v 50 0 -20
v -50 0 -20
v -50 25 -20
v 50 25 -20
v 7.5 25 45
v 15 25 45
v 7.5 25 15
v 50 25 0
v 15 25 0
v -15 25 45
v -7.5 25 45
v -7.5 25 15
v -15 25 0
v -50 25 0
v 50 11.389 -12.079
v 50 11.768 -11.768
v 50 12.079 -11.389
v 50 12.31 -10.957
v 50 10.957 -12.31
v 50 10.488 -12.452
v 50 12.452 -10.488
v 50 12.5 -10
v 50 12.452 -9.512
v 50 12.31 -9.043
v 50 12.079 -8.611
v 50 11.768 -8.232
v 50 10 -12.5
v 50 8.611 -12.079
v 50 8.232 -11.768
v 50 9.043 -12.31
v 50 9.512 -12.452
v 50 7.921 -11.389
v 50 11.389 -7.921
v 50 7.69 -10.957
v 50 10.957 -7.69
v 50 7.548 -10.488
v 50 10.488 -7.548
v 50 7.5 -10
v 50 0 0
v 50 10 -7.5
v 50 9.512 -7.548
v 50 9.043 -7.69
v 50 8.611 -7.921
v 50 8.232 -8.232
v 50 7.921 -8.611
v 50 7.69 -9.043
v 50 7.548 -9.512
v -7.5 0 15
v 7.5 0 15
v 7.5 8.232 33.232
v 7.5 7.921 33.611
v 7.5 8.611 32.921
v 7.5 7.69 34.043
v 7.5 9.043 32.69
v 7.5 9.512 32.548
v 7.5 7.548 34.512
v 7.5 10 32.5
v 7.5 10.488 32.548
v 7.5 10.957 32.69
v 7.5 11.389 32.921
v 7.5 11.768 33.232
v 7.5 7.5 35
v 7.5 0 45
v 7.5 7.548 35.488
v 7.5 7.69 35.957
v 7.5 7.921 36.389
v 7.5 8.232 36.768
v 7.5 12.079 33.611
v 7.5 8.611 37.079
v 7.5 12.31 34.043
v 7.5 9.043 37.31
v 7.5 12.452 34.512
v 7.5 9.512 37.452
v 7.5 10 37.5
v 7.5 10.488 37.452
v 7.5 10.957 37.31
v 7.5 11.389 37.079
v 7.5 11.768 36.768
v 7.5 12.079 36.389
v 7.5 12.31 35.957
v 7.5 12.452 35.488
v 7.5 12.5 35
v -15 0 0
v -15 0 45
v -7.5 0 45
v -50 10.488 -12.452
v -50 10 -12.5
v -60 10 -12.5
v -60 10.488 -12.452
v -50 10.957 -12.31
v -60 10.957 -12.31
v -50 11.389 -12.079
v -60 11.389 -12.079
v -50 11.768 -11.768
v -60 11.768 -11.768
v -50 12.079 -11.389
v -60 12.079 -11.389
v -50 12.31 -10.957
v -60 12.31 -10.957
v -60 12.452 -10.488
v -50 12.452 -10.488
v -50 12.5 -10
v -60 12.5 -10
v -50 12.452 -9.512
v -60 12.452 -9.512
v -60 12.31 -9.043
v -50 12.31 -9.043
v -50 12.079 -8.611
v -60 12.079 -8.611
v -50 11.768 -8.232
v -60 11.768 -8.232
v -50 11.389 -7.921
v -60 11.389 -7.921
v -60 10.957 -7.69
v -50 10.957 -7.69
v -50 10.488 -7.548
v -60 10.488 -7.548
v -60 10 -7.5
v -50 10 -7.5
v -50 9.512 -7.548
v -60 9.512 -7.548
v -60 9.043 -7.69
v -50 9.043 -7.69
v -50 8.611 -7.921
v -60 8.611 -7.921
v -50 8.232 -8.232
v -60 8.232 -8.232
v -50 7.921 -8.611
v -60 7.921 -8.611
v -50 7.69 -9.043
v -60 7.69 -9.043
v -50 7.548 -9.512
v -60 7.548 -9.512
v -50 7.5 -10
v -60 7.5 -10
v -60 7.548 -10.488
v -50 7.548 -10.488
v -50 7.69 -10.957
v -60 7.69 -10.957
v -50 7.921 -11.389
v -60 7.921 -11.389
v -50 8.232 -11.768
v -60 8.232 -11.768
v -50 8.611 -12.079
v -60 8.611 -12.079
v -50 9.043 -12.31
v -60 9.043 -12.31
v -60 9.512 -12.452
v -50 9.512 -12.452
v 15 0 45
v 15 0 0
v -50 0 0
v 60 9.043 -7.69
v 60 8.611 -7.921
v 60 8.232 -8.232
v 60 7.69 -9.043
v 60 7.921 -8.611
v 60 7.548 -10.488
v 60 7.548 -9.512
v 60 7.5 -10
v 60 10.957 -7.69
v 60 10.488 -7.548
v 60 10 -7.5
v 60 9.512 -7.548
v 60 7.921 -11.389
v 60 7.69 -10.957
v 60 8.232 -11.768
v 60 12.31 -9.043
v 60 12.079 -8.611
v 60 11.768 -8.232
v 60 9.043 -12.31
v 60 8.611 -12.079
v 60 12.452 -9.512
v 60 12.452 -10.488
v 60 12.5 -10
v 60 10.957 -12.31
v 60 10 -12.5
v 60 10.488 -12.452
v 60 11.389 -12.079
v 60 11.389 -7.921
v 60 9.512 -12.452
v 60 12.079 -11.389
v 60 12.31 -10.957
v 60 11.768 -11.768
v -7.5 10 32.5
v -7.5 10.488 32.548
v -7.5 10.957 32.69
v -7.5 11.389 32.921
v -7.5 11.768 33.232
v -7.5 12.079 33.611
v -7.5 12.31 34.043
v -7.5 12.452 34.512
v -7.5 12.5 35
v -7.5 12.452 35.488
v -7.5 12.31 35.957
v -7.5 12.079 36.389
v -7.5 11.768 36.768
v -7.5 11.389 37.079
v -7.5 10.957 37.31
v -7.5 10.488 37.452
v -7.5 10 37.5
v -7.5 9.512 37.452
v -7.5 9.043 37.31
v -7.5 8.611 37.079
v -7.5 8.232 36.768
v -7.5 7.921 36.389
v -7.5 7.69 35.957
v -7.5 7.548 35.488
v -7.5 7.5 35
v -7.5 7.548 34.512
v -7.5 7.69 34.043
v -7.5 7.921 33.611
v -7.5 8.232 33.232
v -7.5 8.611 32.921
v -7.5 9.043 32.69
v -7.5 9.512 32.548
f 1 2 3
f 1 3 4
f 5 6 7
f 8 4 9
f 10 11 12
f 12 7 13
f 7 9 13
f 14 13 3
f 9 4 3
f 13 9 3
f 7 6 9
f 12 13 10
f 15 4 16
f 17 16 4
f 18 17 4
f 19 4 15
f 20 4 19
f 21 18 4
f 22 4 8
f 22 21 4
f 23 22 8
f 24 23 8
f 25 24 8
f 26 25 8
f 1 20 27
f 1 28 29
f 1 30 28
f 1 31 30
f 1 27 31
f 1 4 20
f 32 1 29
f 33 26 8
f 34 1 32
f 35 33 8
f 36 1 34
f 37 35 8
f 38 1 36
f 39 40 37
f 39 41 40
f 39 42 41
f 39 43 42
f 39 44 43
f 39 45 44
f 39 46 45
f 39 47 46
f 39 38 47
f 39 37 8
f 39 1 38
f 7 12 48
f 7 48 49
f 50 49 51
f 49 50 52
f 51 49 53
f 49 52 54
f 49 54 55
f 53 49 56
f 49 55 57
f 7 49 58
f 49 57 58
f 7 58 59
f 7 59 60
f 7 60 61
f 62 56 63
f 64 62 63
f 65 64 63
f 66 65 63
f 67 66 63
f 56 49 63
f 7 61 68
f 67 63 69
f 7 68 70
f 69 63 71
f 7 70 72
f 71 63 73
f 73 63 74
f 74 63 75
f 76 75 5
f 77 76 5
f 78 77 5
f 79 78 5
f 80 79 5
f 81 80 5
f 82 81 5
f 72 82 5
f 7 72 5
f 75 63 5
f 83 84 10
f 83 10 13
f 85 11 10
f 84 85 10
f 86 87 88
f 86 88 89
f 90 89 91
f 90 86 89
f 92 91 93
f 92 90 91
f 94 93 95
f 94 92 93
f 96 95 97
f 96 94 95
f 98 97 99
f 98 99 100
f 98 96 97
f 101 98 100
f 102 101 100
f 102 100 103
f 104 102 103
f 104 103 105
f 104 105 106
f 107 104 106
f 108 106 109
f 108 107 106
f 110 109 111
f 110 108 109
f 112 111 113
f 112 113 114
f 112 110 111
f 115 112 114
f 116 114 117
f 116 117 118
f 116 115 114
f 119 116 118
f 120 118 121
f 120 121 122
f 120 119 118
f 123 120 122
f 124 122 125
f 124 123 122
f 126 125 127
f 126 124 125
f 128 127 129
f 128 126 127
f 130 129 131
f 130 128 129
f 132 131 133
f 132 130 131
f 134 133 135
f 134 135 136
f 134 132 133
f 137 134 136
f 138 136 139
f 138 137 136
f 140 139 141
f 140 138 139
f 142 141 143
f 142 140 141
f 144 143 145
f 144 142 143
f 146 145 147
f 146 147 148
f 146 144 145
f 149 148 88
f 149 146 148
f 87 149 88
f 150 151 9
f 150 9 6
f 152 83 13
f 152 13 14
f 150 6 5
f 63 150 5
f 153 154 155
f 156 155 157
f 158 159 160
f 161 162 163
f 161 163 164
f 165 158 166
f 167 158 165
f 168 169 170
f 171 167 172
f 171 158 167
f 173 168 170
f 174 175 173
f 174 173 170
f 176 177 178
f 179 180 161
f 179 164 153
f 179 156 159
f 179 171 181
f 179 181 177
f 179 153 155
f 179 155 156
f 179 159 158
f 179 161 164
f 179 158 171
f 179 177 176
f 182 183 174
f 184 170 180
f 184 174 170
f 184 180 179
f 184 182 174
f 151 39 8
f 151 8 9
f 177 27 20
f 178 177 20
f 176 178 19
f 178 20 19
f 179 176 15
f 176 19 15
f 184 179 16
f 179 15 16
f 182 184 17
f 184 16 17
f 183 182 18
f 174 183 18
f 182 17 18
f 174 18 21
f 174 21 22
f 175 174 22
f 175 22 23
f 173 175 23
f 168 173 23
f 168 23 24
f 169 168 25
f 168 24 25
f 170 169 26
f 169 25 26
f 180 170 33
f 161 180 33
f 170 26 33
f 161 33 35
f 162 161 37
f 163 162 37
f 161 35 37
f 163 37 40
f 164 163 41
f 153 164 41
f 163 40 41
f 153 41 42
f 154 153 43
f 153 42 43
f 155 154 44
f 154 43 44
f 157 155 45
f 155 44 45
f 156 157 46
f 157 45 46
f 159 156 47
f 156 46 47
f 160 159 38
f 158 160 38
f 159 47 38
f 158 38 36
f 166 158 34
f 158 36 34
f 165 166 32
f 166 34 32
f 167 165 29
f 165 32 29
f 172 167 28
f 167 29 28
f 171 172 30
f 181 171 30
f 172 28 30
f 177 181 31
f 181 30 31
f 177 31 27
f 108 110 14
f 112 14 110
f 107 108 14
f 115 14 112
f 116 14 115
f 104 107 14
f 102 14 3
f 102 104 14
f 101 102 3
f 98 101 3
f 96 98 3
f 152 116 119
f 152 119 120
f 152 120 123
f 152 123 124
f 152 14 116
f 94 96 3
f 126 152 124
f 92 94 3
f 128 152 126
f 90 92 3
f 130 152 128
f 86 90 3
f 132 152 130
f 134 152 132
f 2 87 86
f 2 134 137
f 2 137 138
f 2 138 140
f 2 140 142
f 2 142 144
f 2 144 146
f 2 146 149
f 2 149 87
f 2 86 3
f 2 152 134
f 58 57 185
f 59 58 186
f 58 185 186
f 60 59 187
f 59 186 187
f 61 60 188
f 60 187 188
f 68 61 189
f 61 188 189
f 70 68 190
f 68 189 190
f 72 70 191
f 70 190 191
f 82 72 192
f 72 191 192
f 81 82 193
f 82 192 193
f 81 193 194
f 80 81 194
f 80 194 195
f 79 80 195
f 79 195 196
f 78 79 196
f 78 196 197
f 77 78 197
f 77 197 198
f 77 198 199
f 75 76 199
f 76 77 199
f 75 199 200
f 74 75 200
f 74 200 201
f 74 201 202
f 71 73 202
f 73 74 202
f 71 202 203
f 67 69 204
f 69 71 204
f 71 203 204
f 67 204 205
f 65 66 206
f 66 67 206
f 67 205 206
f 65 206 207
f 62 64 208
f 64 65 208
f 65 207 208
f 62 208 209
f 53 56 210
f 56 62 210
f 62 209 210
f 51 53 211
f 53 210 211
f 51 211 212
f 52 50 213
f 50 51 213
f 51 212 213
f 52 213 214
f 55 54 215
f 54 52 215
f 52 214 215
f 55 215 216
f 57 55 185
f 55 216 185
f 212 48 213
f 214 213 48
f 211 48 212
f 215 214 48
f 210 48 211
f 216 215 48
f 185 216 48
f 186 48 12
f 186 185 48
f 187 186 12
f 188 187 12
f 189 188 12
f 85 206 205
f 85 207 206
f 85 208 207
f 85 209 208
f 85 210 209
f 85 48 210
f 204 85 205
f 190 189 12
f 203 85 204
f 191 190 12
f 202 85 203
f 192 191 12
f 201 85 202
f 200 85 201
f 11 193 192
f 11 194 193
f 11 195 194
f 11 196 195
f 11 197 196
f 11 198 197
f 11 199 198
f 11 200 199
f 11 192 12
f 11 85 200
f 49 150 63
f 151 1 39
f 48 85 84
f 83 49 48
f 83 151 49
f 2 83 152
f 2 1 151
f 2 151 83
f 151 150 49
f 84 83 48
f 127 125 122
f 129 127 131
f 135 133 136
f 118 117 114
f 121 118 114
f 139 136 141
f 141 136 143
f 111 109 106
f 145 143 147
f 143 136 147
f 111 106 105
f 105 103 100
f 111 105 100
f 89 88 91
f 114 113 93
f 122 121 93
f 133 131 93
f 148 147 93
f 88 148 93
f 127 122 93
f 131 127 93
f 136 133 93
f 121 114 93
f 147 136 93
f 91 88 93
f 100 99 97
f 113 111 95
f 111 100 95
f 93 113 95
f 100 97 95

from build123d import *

# Parameters (mm, degrees)
BOSS_EXTRUDE1_DEPTH = 25
SKETCH2_W           = 15
SKETCH2_H           = 30
CUT_EXTRUDE1_DEPTH  = 30
SKETCH3_R           = 2.5
BOSS_EXTRUDE2_DEPTH = 10
BOSS_EXTRUDE3_REACH = 69.5
SKETCH5_R           = 2.5


with BuildPart() as part:
    # Sketch1 → Boss-Extrude1 (new body)
    with BuildSketch(Plane(origin=(0, 0, 0), x_dir=(1, 0, 0), z_dir=(0, 1, 0))):
        Polygon((-50, 20), (50, 20), (50, 0), (15, 0), (15, -45), (-15, -45), (-15, 0), (-50, 0), align=None)
    extrude(amount=BOSS_EXTRUDE1_DEPTH)

    # Sketch2 → Cut-Extrude1 (cut)
    with BuildSketch(Plane.XY.offset(45)):
        with Locations((0, 15)):
            Rectangle(SKETCH2_W, SKETCH2_H)
    extrude(amount=-CUT_EXTRUDE1_DEPTH, mode=Mode.SUBTRACT)

    # Sketch3 → Boss-Extrude2 (add)
    with BuildSketch(Plane(origin=(50, 0, 0), x_dir=(0, 0, -1), z_dir=(1, 0, 0))):
        with Locations((10, 10)):
            Circle(SKETCH3_R)
    boss_extrude2 = extrude(amount=BOSS_EXTRUDE2_DEPTH)

    # Mirror1: Boss-Extrude2 across plane
    add(boss_extrude2.mirror(Plane(origin=(0, 0, 0), x_dir=(0, 0, 1), z_dir=(1, 0, 0))))

    # Sketch5 → Boss-Extrude3 (add, up to next)
    with BuildSketch(Plane(origin=(-7.5, 0, 0), x_dir=(0, 0, -1), z_dir=(1, 0, 0)), mode=Mode.PRIVATE) as boss_extrude3_sk1:
        with Locations((-35, 10)):
            Circle(SKETCH5_R)
    boss_extrude3_tool1 = extrude(boss_extrude3_sk1.sketch, amount=BOSS_EXTRUDE3_REACH, mode=Mode.PRIVATE) - part.part
    add(boss_extrude3_tool1.solids().sort_by_distance((-7.5, 10, 35))[0])


solid = part.part
